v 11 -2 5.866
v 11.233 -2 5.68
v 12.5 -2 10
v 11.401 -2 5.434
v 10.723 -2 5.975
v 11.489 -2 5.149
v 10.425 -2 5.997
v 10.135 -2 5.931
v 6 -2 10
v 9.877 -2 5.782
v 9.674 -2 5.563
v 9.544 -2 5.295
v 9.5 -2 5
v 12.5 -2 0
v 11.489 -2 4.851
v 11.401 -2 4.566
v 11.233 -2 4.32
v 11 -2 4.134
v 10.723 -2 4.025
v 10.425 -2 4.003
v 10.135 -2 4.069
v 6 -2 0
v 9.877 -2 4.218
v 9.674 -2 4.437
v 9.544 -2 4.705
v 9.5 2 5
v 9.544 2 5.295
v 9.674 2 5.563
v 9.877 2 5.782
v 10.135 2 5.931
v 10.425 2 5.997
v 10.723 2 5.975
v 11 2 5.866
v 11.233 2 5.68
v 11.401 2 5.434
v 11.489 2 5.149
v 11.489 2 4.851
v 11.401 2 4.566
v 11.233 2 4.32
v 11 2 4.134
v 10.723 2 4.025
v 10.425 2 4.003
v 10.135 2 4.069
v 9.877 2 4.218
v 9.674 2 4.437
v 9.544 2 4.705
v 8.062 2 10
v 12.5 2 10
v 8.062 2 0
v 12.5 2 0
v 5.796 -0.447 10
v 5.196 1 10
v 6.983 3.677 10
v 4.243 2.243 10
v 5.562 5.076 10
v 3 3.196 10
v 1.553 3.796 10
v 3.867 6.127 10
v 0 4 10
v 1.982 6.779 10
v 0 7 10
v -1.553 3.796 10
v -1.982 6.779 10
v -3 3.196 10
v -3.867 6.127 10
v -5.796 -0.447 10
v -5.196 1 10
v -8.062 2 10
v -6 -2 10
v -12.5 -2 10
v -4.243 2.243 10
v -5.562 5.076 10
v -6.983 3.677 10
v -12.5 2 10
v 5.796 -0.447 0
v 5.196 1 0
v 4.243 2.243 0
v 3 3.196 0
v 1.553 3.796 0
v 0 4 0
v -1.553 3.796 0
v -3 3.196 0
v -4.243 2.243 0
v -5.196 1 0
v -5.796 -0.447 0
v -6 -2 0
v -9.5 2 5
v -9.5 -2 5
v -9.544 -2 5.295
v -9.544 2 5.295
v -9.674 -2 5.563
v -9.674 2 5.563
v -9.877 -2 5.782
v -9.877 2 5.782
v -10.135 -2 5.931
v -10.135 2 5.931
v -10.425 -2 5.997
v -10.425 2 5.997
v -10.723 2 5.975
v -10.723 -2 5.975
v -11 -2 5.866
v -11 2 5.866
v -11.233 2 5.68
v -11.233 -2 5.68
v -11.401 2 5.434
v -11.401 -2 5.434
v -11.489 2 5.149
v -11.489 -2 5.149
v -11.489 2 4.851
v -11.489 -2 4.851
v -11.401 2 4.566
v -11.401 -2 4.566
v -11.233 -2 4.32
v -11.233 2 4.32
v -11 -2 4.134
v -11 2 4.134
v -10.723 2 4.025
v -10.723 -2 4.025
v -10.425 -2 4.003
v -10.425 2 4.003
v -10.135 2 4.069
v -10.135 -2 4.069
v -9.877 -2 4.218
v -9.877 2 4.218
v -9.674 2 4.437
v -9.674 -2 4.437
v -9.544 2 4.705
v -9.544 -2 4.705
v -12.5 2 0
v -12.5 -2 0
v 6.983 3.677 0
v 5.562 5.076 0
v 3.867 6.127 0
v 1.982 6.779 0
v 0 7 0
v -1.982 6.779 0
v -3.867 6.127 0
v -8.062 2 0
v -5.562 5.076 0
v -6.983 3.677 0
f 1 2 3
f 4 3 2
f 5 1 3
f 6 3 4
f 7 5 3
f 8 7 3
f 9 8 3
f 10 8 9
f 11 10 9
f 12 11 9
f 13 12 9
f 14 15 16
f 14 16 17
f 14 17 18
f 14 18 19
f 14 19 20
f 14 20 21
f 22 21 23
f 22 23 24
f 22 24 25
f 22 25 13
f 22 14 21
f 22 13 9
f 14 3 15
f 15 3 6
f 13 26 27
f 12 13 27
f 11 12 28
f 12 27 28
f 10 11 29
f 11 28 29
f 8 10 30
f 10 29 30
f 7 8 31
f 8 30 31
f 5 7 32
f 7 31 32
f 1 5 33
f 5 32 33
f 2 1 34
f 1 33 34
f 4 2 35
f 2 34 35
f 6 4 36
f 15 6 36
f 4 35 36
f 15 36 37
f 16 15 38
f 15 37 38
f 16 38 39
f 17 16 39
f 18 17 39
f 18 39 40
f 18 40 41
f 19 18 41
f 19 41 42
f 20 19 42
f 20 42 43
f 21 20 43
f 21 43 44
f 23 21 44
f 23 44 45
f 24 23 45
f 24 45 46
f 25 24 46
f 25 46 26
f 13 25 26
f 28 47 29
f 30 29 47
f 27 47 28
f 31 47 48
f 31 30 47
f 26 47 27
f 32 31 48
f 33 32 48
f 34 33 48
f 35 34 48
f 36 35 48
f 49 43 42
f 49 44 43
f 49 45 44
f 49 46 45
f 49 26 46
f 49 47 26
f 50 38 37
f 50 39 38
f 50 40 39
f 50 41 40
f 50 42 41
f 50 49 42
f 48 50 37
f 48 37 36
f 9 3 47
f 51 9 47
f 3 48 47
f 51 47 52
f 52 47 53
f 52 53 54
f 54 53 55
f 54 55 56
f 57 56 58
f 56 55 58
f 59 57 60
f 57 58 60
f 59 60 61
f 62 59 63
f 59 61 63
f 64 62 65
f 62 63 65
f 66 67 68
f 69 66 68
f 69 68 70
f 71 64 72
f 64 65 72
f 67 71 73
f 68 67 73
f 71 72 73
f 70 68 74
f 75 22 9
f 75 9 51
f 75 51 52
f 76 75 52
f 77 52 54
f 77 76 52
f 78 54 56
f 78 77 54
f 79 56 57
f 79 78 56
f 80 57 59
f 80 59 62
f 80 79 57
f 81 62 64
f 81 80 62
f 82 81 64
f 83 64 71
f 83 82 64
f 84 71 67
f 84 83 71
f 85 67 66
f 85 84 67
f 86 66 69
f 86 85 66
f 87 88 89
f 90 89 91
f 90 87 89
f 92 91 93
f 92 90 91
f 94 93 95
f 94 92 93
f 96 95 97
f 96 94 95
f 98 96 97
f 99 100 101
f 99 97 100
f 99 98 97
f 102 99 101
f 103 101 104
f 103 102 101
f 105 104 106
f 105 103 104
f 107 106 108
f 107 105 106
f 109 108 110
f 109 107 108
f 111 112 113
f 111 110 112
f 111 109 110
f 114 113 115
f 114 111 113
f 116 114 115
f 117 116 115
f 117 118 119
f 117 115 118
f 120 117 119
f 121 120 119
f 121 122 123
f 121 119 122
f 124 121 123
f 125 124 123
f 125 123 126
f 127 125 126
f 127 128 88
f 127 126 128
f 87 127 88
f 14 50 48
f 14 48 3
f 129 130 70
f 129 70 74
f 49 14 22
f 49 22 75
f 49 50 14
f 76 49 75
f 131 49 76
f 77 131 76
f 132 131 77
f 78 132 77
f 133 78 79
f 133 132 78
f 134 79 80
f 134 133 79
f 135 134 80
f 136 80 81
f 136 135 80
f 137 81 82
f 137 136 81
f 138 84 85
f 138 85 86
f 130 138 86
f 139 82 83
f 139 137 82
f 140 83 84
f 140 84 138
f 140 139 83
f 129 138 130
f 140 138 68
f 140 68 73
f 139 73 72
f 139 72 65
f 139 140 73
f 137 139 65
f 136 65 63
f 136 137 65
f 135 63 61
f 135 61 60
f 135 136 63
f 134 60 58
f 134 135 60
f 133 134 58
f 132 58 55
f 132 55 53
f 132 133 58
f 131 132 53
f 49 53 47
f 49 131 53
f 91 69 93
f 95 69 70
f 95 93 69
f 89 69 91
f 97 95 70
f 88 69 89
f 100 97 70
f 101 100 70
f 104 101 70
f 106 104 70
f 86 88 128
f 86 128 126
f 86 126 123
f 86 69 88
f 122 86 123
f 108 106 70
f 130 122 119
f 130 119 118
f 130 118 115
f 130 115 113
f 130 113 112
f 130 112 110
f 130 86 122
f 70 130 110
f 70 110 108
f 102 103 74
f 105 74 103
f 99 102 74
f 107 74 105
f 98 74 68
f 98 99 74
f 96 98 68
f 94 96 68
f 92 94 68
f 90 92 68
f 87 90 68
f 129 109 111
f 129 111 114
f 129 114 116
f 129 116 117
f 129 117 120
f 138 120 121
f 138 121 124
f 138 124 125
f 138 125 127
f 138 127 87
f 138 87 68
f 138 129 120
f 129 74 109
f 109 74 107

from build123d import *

# Parameters (mm, degrees)
SALIENTE_EXTRUIR1_DEPTH = 10
CROQUIS2_R              = 1
CORTAR_EXTRUIR1_DEPTH   = 10


with BuildPart() as part:
    # Croquis1 → Saliente-Extruir1 (new body)
    with BuildSketch(Plane.XY):
        with BuildLine():
            Line((12.5, -2), (6, -2))
            ThreePointArc((6, -2), (0, 4), (-6, -2))
            Line((-6, -2), (-12.5, -2))
            Line((-12.5, -2), (-12.5, 2))
            Line((-12.5, 2), (-8.062257748, 2))
            ThreePointArc((-8.062257748, 2), (0, 7), (8.062257748, 2))
            Line((8.062257748, 2), (12.5, 2))
            Line((12.5, 2), (12.5, -2))
        make_face()
    extrude(amount=SALIENTE_EXTRUIR1_DEPTH)

    # Croquis2 → Cortar-Extruir1 (cut)
    with BuildSketch(Plane(origin=(0, 2, 0), x_dir=(1, 0, 0), z_dir=(0, 1, 0))):
        with Locations(Location((10.5, -5, 0), (0, 0, 180))):
            Circle(CROQUIS2_R)
    cortar_extruir1 = extrude(amount=-CORTAR_EXTRUIR1_DEPTH, mode=Mode.SUBTRACT)

    # Simetría1: Cortar-Extruir1 across plane
    add(cortar_extruir1.mirror(Plane(origin=(0, 0, 0), x_dir=(0, 0, 1), z_dir=(1, 0, 0))), mode=Mode.SUBTRACT)


solid = part.part
